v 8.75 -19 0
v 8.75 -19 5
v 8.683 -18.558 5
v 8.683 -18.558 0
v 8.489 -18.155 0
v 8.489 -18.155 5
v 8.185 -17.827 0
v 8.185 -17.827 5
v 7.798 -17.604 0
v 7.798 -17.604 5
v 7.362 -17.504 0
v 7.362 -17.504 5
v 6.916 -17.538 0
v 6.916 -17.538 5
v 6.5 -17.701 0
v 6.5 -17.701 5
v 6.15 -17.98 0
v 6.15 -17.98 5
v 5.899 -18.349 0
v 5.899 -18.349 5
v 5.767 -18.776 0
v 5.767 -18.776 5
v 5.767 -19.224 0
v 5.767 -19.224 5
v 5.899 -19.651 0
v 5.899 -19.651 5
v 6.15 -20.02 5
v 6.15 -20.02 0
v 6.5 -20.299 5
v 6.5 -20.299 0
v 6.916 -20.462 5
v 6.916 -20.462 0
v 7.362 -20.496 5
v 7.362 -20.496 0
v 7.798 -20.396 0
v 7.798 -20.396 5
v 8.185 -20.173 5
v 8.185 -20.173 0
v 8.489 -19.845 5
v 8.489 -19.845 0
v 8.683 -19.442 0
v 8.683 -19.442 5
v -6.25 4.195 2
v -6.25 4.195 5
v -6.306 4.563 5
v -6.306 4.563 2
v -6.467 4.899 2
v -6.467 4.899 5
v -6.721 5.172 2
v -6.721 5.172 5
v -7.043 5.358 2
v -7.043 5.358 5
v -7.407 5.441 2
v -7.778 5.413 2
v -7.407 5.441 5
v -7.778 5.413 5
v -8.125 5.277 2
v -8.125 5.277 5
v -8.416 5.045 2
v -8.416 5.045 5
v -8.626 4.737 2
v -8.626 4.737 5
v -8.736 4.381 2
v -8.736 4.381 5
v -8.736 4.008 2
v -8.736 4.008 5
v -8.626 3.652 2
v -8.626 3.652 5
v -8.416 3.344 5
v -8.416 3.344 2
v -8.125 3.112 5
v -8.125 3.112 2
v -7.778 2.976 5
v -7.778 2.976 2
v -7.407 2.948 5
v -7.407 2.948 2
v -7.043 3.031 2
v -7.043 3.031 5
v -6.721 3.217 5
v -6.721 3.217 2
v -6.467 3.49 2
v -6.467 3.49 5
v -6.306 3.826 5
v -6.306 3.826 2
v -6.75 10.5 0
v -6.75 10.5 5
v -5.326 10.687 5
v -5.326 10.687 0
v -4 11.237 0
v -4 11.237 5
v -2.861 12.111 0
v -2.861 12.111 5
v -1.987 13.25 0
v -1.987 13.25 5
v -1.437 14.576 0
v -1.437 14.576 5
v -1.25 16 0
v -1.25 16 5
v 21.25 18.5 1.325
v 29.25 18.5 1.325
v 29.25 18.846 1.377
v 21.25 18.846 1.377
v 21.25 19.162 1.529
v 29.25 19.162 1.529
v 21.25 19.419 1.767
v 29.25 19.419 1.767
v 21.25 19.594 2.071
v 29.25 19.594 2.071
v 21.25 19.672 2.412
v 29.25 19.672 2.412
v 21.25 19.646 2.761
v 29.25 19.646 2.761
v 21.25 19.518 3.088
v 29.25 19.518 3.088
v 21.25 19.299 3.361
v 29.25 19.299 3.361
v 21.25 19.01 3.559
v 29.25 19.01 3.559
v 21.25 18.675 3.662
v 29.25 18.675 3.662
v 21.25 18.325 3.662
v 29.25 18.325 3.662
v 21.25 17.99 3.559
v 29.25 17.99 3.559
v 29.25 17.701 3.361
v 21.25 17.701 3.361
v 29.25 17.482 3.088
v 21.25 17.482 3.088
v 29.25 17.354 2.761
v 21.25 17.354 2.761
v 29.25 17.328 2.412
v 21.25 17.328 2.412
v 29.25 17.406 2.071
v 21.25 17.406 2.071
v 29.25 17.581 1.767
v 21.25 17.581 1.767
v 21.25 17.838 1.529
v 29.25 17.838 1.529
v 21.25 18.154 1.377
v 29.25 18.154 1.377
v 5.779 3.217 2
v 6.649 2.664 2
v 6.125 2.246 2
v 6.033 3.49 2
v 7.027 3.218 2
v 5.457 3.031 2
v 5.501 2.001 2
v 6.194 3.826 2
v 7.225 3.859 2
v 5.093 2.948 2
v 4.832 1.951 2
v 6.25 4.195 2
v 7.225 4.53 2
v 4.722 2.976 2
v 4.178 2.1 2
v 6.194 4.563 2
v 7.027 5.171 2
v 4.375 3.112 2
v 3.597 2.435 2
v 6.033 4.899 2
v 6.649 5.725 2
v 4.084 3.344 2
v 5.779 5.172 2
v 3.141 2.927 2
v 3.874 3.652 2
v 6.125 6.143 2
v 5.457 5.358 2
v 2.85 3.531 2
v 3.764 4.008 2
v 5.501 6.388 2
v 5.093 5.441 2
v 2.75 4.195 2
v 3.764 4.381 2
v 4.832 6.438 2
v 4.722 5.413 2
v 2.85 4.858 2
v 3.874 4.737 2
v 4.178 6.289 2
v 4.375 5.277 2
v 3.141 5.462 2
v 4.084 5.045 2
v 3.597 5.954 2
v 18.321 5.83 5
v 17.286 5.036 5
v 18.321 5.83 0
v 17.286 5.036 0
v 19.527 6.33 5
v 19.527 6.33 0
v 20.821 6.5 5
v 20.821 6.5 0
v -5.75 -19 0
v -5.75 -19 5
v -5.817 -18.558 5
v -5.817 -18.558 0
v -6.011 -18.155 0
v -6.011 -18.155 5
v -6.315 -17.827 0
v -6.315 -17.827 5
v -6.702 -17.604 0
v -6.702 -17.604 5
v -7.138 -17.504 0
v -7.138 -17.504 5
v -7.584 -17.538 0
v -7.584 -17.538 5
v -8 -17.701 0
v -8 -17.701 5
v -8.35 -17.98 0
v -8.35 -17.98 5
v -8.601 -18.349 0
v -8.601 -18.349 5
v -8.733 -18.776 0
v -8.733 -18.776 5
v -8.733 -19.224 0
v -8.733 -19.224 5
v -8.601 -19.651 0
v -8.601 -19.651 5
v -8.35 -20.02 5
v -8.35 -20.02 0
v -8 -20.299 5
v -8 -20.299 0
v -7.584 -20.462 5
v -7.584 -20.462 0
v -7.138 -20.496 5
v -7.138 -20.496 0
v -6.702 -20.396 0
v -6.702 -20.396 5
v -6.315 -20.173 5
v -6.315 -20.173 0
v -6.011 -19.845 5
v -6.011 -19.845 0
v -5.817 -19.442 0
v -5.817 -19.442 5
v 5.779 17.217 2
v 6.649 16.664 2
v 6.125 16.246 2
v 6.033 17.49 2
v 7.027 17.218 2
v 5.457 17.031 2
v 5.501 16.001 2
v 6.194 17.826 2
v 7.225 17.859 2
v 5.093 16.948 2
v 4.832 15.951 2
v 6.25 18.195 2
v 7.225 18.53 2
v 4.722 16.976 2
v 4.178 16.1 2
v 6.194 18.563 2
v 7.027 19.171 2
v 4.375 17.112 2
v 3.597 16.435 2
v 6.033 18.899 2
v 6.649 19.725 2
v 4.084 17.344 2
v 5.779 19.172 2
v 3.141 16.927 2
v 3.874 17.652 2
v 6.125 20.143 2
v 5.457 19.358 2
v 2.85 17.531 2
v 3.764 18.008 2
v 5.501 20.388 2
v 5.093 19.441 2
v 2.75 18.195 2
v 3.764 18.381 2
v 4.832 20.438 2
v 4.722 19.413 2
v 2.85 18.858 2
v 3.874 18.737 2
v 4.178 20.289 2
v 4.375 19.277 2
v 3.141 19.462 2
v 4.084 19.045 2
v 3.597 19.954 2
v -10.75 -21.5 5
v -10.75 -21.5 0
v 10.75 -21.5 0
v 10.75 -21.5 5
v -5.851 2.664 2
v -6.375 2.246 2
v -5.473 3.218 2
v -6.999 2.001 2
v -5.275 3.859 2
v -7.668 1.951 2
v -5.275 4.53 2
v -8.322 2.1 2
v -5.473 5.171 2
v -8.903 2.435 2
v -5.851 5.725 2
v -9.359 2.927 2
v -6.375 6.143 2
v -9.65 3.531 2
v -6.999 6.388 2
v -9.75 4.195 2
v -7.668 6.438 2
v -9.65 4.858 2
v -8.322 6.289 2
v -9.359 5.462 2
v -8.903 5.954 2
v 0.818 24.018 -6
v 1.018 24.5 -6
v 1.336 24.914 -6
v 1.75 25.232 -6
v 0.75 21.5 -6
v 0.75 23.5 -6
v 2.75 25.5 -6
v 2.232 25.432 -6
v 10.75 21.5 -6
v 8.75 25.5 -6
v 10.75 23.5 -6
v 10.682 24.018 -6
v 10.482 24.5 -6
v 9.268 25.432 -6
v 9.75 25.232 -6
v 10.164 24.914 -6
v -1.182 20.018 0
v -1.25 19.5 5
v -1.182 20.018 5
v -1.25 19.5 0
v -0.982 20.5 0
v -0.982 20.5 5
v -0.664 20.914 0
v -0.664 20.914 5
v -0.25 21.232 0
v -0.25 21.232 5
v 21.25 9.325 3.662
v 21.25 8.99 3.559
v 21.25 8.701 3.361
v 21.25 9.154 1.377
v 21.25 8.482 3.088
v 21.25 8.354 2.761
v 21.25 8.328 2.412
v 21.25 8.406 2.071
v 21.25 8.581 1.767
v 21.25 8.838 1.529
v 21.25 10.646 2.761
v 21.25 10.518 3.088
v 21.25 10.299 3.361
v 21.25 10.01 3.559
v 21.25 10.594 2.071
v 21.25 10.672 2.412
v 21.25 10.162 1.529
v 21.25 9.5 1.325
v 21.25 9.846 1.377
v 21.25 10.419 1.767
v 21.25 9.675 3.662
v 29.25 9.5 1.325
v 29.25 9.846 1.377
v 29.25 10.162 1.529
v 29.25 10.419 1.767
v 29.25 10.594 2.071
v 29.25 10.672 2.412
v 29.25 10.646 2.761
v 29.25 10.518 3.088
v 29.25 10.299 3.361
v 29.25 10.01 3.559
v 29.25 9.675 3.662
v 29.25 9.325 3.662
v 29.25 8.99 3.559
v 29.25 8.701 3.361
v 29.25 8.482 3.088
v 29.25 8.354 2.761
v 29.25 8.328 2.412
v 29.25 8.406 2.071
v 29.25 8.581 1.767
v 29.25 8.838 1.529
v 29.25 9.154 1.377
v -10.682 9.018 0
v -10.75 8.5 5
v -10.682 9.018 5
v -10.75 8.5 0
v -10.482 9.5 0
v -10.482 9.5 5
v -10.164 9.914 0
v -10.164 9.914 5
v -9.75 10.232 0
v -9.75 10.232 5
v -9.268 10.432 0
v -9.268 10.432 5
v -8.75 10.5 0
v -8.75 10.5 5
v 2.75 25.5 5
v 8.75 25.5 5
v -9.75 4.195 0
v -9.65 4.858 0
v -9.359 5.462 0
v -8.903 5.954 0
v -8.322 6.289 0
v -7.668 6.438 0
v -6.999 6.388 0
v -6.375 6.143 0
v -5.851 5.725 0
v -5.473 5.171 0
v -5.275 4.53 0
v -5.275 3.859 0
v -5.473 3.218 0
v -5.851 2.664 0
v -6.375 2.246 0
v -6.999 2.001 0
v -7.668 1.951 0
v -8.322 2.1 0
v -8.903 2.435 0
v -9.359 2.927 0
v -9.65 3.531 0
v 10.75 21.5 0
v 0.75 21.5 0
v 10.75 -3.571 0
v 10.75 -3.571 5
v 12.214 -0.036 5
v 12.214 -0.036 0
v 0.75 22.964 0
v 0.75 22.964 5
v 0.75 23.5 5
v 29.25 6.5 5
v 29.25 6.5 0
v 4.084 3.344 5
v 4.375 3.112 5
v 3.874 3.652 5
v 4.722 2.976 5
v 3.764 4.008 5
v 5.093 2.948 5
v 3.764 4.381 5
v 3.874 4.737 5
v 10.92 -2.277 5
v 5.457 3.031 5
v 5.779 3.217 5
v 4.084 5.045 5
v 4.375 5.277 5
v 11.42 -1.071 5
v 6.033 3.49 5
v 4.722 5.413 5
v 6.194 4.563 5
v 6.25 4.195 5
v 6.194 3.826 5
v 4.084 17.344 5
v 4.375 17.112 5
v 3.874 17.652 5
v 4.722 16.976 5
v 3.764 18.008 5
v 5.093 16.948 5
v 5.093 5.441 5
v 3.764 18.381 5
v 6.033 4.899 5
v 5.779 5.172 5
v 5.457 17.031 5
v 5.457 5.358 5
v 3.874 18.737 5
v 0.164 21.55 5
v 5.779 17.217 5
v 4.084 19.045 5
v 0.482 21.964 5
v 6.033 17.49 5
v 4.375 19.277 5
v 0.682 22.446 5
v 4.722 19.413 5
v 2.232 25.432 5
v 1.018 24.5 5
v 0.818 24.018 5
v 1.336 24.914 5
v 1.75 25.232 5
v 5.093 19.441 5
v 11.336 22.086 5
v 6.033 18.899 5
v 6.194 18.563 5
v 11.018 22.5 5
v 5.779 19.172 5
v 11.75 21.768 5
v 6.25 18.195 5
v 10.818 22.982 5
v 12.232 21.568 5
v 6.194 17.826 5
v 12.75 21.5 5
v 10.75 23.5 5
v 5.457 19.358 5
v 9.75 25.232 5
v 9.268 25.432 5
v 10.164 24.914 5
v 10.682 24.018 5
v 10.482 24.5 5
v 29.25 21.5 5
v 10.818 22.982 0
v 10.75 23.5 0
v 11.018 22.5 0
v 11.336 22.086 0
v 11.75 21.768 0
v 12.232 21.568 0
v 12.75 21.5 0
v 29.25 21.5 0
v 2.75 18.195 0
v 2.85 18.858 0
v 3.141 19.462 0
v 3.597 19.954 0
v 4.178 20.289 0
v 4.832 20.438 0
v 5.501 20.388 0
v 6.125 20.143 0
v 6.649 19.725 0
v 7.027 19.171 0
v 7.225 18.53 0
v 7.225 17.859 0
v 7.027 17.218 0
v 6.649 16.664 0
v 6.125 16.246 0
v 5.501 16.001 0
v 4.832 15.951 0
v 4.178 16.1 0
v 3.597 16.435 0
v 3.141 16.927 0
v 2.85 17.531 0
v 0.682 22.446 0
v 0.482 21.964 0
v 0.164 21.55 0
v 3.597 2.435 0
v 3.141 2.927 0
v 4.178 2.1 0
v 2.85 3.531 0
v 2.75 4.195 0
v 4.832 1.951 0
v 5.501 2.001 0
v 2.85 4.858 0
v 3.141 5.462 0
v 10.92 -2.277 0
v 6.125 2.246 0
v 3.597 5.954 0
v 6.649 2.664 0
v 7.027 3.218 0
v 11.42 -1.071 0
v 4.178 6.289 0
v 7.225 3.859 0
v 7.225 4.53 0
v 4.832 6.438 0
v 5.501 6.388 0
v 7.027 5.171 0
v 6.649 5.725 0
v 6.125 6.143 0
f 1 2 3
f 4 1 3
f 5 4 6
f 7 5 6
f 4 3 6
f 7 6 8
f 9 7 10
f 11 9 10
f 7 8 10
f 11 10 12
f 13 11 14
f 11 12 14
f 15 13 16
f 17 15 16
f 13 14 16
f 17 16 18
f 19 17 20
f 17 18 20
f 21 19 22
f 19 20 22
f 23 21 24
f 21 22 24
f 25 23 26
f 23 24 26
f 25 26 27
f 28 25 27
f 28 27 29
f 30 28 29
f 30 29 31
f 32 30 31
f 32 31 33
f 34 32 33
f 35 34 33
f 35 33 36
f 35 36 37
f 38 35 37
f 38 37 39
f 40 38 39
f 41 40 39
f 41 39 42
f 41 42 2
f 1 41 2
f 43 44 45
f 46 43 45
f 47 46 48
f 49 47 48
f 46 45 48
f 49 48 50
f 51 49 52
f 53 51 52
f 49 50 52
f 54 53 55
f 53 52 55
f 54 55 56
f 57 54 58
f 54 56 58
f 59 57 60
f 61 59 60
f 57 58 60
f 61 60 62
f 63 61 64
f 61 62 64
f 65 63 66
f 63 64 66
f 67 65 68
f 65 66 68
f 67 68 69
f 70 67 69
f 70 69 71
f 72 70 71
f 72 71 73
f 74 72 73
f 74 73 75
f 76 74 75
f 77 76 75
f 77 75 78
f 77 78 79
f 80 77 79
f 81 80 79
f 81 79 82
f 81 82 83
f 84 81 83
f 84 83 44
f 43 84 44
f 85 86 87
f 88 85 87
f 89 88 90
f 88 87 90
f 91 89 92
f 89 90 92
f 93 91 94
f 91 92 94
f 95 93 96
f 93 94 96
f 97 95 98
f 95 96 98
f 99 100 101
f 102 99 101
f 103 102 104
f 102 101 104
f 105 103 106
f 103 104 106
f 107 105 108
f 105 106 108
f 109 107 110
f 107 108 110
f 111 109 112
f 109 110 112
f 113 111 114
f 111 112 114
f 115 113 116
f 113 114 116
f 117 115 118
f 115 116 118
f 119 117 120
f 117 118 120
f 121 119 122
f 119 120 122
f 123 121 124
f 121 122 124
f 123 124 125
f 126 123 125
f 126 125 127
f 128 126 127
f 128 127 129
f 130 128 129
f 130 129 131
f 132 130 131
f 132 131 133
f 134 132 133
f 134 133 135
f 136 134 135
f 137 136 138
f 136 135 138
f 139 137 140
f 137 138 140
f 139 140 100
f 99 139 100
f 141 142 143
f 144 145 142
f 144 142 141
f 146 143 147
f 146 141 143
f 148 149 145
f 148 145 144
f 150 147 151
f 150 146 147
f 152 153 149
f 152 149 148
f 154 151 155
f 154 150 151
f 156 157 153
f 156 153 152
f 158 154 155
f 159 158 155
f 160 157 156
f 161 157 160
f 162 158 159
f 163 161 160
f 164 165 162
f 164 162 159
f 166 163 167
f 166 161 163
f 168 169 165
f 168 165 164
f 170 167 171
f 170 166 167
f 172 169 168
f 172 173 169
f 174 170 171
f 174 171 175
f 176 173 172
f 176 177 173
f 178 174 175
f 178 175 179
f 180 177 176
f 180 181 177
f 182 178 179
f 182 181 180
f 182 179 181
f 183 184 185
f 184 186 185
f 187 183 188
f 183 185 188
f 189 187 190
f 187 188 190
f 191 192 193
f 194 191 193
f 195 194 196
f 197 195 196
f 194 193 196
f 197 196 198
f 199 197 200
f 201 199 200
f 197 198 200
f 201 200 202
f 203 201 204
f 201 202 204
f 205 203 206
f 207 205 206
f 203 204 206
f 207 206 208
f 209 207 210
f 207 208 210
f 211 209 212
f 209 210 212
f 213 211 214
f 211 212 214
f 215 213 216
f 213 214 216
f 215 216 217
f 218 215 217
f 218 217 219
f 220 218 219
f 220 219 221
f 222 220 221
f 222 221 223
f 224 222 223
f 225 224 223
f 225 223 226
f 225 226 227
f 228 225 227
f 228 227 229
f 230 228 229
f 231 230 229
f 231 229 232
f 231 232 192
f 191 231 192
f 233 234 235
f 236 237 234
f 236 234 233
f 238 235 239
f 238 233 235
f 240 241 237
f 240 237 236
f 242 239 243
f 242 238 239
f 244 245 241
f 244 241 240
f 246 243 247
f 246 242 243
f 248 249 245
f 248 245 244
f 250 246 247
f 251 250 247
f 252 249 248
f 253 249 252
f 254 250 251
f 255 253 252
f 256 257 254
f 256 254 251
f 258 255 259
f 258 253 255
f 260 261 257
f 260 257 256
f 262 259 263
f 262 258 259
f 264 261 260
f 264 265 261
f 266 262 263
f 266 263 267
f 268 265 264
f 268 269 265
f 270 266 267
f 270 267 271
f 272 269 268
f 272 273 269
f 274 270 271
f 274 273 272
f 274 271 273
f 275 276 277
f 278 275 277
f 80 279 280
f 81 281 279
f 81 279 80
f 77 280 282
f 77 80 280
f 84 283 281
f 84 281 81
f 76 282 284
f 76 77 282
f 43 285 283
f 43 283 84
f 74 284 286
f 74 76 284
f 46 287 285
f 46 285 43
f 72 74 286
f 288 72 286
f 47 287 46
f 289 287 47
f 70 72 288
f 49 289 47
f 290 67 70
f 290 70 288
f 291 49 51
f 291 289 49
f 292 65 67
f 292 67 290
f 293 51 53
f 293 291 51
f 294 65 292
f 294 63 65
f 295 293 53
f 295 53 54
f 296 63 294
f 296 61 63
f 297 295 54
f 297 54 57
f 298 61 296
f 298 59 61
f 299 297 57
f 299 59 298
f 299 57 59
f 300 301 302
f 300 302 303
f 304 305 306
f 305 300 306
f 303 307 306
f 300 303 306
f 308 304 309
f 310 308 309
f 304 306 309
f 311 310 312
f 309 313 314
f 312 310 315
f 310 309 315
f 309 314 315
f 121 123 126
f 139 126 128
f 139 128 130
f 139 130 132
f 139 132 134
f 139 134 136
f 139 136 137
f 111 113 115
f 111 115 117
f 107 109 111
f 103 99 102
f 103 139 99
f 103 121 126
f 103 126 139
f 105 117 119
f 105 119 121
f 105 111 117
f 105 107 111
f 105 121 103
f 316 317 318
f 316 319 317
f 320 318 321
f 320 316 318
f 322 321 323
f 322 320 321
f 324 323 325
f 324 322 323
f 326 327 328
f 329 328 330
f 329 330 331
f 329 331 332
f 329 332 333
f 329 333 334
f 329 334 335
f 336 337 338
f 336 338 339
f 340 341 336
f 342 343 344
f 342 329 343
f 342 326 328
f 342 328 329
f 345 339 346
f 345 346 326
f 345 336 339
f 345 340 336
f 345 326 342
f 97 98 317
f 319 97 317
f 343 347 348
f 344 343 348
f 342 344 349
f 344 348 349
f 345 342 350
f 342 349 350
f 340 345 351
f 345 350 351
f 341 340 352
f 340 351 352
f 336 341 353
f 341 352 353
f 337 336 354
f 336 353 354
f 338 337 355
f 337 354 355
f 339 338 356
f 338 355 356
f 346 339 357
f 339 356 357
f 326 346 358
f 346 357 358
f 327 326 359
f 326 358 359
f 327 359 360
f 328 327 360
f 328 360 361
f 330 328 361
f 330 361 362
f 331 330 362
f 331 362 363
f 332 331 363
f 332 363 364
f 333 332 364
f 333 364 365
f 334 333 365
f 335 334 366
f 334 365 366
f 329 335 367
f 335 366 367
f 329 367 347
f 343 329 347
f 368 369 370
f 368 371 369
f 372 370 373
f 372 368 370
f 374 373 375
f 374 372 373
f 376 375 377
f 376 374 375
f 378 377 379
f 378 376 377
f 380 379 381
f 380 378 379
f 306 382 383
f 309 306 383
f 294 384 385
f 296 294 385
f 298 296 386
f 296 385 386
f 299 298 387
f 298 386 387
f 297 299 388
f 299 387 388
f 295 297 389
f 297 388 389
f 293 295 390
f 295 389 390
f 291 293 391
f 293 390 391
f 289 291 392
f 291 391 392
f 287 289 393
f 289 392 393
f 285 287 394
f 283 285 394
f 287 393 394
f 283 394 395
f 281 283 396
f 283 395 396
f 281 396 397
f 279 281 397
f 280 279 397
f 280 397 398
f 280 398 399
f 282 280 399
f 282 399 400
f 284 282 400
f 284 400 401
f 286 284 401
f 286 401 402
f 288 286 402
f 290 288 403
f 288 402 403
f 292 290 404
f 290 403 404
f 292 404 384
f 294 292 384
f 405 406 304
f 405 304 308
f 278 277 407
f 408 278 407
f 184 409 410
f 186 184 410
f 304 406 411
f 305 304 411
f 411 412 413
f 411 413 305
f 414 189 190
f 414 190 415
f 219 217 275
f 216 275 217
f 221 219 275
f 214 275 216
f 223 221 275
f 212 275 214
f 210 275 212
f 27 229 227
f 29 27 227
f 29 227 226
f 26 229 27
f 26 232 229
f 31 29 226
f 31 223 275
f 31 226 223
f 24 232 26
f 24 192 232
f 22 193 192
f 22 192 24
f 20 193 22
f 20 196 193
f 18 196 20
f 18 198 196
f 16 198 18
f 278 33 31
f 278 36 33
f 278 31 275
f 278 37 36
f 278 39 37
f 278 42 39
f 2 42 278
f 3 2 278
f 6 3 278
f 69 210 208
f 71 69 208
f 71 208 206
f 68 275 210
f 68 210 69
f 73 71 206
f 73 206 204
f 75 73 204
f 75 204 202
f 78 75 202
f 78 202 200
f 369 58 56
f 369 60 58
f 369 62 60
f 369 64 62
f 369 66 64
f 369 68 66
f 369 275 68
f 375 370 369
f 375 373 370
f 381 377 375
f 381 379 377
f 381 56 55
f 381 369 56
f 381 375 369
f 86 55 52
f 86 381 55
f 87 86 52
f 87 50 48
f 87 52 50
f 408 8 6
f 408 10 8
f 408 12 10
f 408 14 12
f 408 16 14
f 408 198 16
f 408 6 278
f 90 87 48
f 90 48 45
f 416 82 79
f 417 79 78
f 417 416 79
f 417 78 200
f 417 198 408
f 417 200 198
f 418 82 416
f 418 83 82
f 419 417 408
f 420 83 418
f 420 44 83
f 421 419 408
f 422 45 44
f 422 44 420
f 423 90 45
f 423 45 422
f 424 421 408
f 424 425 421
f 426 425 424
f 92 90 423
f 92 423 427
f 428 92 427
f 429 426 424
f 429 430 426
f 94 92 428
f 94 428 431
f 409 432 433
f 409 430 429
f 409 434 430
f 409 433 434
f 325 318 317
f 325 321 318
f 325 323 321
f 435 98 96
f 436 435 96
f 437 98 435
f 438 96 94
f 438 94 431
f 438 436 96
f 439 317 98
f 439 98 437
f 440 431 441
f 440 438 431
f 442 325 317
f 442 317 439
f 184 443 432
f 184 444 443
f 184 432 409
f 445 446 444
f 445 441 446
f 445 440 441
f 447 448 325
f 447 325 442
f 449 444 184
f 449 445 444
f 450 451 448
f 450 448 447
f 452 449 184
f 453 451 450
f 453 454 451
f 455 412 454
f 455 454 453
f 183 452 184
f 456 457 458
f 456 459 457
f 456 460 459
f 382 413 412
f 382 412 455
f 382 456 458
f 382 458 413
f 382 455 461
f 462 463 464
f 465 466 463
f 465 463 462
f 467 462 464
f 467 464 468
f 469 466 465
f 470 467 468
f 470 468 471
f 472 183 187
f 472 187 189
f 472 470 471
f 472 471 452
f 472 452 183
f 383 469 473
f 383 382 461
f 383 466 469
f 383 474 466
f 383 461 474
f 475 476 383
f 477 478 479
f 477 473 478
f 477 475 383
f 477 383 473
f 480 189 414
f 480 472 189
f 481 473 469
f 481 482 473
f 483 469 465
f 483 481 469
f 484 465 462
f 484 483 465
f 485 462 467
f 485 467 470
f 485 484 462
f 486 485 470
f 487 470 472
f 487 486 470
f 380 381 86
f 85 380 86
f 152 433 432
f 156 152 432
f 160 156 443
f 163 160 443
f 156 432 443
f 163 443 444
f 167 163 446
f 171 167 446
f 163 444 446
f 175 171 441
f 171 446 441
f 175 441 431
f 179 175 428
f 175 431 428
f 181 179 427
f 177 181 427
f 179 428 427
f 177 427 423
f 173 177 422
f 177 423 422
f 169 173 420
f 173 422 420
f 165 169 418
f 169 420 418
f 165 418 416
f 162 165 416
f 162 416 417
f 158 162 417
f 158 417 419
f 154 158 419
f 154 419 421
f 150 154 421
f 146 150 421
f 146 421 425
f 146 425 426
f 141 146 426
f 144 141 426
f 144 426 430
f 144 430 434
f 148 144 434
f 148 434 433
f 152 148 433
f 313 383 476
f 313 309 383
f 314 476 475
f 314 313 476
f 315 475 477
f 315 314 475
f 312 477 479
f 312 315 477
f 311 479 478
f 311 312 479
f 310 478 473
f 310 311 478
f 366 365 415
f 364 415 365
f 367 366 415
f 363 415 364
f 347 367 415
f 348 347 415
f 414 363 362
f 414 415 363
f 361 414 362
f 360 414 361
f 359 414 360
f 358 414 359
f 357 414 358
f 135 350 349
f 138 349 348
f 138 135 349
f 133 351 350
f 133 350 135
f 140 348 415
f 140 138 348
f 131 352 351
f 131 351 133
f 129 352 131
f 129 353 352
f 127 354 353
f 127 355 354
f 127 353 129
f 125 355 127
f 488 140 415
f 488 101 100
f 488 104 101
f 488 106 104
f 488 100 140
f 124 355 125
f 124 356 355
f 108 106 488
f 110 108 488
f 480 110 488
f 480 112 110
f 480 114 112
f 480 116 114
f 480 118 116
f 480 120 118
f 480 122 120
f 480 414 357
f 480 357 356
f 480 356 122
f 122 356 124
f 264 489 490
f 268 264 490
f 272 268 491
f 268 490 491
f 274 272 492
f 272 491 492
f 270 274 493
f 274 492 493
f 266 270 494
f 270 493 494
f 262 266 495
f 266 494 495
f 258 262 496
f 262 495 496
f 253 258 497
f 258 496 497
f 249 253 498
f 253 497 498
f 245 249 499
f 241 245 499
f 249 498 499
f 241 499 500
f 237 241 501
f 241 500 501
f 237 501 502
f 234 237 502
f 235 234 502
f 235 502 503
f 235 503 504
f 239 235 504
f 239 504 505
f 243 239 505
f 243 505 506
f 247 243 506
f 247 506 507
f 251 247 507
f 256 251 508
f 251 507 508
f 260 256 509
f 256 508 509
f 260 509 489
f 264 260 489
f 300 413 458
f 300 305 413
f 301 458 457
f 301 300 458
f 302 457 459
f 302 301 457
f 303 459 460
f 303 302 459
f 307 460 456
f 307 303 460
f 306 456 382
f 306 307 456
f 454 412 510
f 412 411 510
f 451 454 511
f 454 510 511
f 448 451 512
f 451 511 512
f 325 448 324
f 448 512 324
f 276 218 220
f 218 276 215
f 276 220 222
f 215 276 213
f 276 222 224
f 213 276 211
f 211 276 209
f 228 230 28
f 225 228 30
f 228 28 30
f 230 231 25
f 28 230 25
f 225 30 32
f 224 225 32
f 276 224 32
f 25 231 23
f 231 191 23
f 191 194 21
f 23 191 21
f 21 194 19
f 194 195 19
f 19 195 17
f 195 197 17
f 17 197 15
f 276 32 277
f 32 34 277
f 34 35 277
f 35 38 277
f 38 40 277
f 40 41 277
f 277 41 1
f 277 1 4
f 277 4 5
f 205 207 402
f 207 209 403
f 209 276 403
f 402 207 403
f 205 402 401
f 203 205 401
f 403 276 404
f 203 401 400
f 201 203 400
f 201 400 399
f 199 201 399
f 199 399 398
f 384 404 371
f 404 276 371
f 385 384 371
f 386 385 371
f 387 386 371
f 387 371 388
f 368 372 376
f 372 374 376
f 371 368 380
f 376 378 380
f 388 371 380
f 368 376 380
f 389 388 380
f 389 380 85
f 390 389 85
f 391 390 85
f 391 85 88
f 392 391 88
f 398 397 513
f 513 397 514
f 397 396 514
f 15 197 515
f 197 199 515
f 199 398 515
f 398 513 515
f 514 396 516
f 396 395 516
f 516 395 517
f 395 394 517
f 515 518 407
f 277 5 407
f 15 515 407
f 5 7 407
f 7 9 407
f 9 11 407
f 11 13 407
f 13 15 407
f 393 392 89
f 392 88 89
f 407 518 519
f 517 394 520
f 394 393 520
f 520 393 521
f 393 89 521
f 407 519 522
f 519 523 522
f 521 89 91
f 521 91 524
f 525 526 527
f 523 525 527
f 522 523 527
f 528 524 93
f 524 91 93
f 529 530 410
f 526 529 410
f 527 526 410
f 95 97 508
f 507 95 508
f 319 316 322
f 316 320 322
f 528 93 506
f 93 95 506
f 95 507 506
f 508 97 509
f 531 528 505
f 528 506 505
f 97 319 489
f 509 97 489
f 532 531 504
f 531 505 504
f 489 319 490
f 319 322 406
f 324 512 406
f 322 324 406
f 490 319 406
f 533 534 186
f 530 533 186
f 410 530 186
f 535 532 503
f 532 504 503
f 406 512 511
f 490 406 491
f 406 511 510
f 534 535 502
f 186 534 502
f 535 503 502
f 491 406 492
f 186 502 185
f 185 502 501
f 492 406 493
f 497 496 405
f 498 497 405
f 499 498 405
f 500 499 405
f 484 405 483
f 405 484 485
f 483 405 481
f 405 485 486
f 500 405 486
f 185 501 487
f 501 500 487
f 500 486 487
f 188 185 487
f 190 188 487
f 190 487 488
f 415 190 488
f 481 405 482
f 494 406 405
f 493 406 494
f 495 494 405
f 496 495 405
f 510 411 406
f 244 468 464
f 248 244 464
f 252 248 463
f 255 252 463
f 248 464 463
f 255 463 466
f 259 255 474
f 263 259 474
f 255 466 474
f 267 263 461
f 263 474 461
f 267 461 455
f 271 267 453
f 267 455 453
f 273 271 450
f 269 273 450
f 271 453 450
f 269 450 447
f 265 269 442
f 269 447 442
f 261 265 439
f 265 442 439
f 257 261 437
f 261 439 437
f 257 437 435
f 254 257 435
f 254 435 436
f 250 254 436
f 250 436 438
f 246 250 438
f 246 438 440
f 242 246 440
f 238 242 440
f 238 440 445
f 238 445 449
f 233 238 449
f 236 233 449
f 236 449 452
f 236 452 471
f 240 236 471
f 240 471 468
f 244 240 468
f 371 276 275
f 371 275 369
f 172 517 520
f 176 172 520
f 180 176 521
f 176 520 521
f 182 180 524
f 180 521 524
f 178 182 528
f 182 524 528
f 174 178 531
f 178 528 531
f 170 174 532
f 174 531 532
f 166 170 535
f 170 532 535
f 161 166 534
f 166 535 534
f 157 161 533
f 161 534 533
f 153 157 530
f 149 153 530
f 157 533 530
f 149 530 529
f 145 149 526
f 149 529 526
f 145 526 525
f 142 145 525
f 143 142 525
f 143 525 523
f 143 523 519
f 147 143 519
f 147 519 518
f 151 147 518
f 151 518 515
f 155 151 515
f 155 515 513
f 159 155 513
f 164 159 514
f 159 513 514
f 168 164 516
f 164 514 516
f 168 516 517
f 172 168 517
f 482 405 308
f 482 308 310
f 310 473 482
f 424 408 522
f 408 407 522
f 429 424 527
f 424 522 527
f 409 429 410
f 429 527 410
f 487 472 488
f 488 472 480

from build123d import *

# Parameters (mm, degrees)
SKETCH1_W           = 21.5
SKETCH1_H           = 43
BOSS_EXTRUDE1_DEPTH = 5
CUT_EXTRUDE1_DEPTH  = 5
SKETCH7_W           = 18.5
SKETCH7_H           = 15
BOSS_EXTRUDE2_DEPTH = 5
SKETCH8_R           = 1.175
CUT_EXTRUDE4_DEPTH  = 8
CUT_EXTRUDE5_REACH  = 38.644
SKETCH11_R          = 1.25
CUT_EXTRUDE6_REACH  = 38.644
SKETCH3_R           = 1.5
SKETCH12_R          = 2.25
CUT_EXTRUDE7_DEPTH  = 2
CHAMFER1_SIZE       = 8
CUT_EXTRUDE8_REACH  = 38.644
FILLET4_R           = 2
FILLET5_R           = 5
SKETCH17_W          = 10
SKETCH17_H          = 4
BOSS_EXTRUDE3_DEPTH = 11
FILLET6_R           = 2


with BuildPart() as part:
    # Sketch1 → Boss-Extrude1 (new body)
    with BuildSketch(Plane.XY):
        Rectangle(SKETCH1_W, SKETCH1_H)
    extrude(amount=BOSS_EXTRUDE1_DEPTH)

    # Sketch2 → Cut-Extrude1 (cut)
    with BuildSketch(Plane.XY.offset(5)):
        with BuildLine():
            Line((-6.75, 12.499561173), (-10.75, 12.499561173))
            Line((-10.75, 12.499561173), (-10.75, 21.5))
            Line((-10.75, 21.5), (-3.25, 21.5))
            Line((-3.25, 21.5), (-3.25, 15.944574555))
            ThreePointArc((-3.25, 15.944574555), (-4.294490012, 13.505297076), (-6.75, 12.499561173))
        make_face()
    extrude(amount=-CUT_EXTRUDE1_DEPTH, mode=Mode.SUBTRACT)

    # Sketch7 → Boss-Extrude2 (add)
    with BuildSketch(Plane.XY.offset(5)):
        with Locations((20, 14)):
            Rectangle(SKETCH7_W, SKETCH7_H)
    extrude(amount=-BOSS_EXTRUDE2_DEPTH)

    # Sketch8 → Cut-Extrude4 (cut)
    with BuildSketch(Plane(origin=(29.25, 0, 0), x_dir=(0, 0, -1), z_dir=(1, 0, 0))):
        with Locations((-2.5, 9.5)):
            Circle(SKETCH8_R)
        with Locations((-2.5, 18.5)):
            Circle(SKETCH8_R)
    extrude(amount=-CUT_EXTRUDE4_DEPTH, mode=Mode.SUBTRACT)

    # Sketch11 → Cut-Extrude5 (cut, up to next)
    with BuildSketch(Plane.XY.offset(5), mode=Mode.PRIVATE) as cut_extrude5_sk1:
        with Locations((5, 4.194574555)):
            Circle(SKETCH11_R)
    cut_extrude5_tool1 = extrude(cut_extrude5_sk1.sketch, amount=-CUT_EXTRUDE5_REACH, mode=Mode.PRIVATE) & part.part
    # Sketch11 → Cut-Extrude5 (cut, up to next)
    with BuildSketch(Plane.XY.offset(5), mode=Mode.PRIVATE) as cut_extrude5_sk2:
        with Locations((-7.5, 4.194574555)):
            Circle(SKETCH11_R)
    cut_extrude5_tool2 = extrude(cut_extrude5_sk2.sketch, amount=-CUT_EXTRUDE5_REACH, mode=Mode.PRIVATE) & part.part
    # Sketch11 → Cut-Extrude5 (cut, up to next)
    with BuildSketch(Plane.XY.offset(5), mode=Mode.PRIVATE) as cut_extrude5_sk3:
        with Locations((5, 18.194574555)):
            Circle(SKETCH11_R)
    cut_extrude5_tool3 = extrude(cut_extrude5_sk3.sketch, amount=-CUT_EXTRUDE5_REACH, mode=Mode.PRIVATE) & part.part
    add(cut_extrude5_tool1.solids().sort_by_distance((5, 4.194575, 5))[0], mode=Mode.SUBTRACT)
    add(cut_extrude5_tool2.solids().sort_by_distance((-7.5, 4.194575, 5))[0], mode=Mode.SUBTRACT)
    add(cut_extrude5_tool3.solids().sort_by_distance((5, 18.194575, 5))[0], mode=Mode.SUBTRACT)

    # Sketch3 → Cut-Extrude6 (cut, up to next)
    with BuildSketch(Plane.XY.offset(5), mode=Mode.PRIVATE) as cut_extrude6_sk1:
        with Locations((-7.25, -19)):
            Circle(SKETCH3_R)
    cut_extrude6_tool1 = extrude(cut_extrude6_sk1.sketch, amount=-CUT_EXTRUDE6_REACH, mode=Mode.PRIVATE) & part.part
    # Sketch3 → Cut-Extrude6 (cut, up to next)
    with BuildSketch(Plane.XY.offset(5), mode=Mode.PRIVATE) as cut_extrude6_sk2:
        with Locations((7.25, -19)):
            Circle(SKETCH3_R)
    cut_extrude6_tool2 = extrude(cut_extrude6_sk2.sketch, amount=-CUT_EXTRUDE6_REACH, mode=Mode.PRIVATE) & part.part
    add(cut_extrude6_tool1.solids().sort_by_distance((-7.25, -19, 5))[0], mode=Mode.SUBTRACT)
    add(cut_extrude6_tool2.solids().sort_by_distance((7.25, -19, 5))[0], mode=Mode.SUBTRACT)

    # Sketch12 → Cut-Extrude7 (cut)
    with BuildSketch(Plane(origin=(0, 0, 0), x_dir=(-1, 0, 0), z_dir=(0, 0, -1))):
        with Locations((-5, 4.194574555)):
            Circle(SKETCH12_R)
        with Locations((-5, 18.194574555)):
            Circle(SKETCH12_R)
        with Locations((7.5, 4.194574555)):
            Circle(SKETCH12_R)
    extrude(amount=-CUT_EXTRUDE7_DEPTH, mode=Mode.SUBTRACT)

    # Chamfer1
    chamfer1_edges = [part.edges().sort_by_distance(p)[0] for p in [
        (10.75, 6.5, 2.5),
    ]]
    chamfer(chamfer1_edges, length=CHAMFER1_SIZE)

    # Sketch14 → Cut-Extrude8 (cut, up to next)
    with BuildSketch(Plane.XY.offset(5), mode=Mode.PRIVATE) as cut_extrude8_sk1:
        with BuildLine():
            Line((-10.75, 10.5), (-6.75, 10.5))
            ThreePointArc((-6.75, 10.5), (-2.860912703, 12.110912703), (-1.25, 16))
            Line((-1.25, 16), (-1.25, 21.5))
            Line((-1.25, 21.5), (-10.75, 21.5))
            Line((-10.75, 21.5), (-10.75, 10.5))
        make_face()
    cut_extrude8_tool1 = extrude(cut_extrude8_sk1.sketch, amount=-CUT_EXTRUDE8_REACH, mode=Mode.PRIVATE) & part.part
    add(cut_extrude8_tool1.solids().sort_by_distance((-6.23325, 16.282927, 5))[0], mode=Mode.SUBTRACT)

    # Fillet4
    fillet4_edges = [part.edges().sort_by_distance(p)[0] for p in [
        (-1.25, 21.5, 2.5),
        (-10.75, 10.5, 2.5),
    ]]
    fillet(fillet4_edges, radius=FILLET4_R)

    # Fillet5
    fillet5_edges = [part.edges().sort_by_distance(p)[0] for p in [
        (18.75, 6.5, 2.5),
        (10.75, -1.5, 2.5),
    ]]
    fillet(fillet5_edges, radius=FILLET5_R)

    # Sketch17 → Boss-Extrude3 (add)
    with BuildSketch(Plane.XY.offset(5)):
        with Locations((5.75, 23.5)):
            Rectangle(SKETCH17_W, SKETCH17_H)
    extrude(amount=-BOSS_EXTRUDE3_DEPTH)

    # Fillet6
    fillet6_edges = [part.edges().sort_by_distance(p)[0] for p in [
        (0.75, 21.5, 2.5),
        (10.75, 21.5, 2.5),
        (10.75, 25.5, -0.5),
        (0.75, 25.5, -0.5),
    ]]
    fillet(fillet6_edges, radius=FILLET6_R - 0.0001)  # a hair under: the kernel refuses the full size


solid = part.part
